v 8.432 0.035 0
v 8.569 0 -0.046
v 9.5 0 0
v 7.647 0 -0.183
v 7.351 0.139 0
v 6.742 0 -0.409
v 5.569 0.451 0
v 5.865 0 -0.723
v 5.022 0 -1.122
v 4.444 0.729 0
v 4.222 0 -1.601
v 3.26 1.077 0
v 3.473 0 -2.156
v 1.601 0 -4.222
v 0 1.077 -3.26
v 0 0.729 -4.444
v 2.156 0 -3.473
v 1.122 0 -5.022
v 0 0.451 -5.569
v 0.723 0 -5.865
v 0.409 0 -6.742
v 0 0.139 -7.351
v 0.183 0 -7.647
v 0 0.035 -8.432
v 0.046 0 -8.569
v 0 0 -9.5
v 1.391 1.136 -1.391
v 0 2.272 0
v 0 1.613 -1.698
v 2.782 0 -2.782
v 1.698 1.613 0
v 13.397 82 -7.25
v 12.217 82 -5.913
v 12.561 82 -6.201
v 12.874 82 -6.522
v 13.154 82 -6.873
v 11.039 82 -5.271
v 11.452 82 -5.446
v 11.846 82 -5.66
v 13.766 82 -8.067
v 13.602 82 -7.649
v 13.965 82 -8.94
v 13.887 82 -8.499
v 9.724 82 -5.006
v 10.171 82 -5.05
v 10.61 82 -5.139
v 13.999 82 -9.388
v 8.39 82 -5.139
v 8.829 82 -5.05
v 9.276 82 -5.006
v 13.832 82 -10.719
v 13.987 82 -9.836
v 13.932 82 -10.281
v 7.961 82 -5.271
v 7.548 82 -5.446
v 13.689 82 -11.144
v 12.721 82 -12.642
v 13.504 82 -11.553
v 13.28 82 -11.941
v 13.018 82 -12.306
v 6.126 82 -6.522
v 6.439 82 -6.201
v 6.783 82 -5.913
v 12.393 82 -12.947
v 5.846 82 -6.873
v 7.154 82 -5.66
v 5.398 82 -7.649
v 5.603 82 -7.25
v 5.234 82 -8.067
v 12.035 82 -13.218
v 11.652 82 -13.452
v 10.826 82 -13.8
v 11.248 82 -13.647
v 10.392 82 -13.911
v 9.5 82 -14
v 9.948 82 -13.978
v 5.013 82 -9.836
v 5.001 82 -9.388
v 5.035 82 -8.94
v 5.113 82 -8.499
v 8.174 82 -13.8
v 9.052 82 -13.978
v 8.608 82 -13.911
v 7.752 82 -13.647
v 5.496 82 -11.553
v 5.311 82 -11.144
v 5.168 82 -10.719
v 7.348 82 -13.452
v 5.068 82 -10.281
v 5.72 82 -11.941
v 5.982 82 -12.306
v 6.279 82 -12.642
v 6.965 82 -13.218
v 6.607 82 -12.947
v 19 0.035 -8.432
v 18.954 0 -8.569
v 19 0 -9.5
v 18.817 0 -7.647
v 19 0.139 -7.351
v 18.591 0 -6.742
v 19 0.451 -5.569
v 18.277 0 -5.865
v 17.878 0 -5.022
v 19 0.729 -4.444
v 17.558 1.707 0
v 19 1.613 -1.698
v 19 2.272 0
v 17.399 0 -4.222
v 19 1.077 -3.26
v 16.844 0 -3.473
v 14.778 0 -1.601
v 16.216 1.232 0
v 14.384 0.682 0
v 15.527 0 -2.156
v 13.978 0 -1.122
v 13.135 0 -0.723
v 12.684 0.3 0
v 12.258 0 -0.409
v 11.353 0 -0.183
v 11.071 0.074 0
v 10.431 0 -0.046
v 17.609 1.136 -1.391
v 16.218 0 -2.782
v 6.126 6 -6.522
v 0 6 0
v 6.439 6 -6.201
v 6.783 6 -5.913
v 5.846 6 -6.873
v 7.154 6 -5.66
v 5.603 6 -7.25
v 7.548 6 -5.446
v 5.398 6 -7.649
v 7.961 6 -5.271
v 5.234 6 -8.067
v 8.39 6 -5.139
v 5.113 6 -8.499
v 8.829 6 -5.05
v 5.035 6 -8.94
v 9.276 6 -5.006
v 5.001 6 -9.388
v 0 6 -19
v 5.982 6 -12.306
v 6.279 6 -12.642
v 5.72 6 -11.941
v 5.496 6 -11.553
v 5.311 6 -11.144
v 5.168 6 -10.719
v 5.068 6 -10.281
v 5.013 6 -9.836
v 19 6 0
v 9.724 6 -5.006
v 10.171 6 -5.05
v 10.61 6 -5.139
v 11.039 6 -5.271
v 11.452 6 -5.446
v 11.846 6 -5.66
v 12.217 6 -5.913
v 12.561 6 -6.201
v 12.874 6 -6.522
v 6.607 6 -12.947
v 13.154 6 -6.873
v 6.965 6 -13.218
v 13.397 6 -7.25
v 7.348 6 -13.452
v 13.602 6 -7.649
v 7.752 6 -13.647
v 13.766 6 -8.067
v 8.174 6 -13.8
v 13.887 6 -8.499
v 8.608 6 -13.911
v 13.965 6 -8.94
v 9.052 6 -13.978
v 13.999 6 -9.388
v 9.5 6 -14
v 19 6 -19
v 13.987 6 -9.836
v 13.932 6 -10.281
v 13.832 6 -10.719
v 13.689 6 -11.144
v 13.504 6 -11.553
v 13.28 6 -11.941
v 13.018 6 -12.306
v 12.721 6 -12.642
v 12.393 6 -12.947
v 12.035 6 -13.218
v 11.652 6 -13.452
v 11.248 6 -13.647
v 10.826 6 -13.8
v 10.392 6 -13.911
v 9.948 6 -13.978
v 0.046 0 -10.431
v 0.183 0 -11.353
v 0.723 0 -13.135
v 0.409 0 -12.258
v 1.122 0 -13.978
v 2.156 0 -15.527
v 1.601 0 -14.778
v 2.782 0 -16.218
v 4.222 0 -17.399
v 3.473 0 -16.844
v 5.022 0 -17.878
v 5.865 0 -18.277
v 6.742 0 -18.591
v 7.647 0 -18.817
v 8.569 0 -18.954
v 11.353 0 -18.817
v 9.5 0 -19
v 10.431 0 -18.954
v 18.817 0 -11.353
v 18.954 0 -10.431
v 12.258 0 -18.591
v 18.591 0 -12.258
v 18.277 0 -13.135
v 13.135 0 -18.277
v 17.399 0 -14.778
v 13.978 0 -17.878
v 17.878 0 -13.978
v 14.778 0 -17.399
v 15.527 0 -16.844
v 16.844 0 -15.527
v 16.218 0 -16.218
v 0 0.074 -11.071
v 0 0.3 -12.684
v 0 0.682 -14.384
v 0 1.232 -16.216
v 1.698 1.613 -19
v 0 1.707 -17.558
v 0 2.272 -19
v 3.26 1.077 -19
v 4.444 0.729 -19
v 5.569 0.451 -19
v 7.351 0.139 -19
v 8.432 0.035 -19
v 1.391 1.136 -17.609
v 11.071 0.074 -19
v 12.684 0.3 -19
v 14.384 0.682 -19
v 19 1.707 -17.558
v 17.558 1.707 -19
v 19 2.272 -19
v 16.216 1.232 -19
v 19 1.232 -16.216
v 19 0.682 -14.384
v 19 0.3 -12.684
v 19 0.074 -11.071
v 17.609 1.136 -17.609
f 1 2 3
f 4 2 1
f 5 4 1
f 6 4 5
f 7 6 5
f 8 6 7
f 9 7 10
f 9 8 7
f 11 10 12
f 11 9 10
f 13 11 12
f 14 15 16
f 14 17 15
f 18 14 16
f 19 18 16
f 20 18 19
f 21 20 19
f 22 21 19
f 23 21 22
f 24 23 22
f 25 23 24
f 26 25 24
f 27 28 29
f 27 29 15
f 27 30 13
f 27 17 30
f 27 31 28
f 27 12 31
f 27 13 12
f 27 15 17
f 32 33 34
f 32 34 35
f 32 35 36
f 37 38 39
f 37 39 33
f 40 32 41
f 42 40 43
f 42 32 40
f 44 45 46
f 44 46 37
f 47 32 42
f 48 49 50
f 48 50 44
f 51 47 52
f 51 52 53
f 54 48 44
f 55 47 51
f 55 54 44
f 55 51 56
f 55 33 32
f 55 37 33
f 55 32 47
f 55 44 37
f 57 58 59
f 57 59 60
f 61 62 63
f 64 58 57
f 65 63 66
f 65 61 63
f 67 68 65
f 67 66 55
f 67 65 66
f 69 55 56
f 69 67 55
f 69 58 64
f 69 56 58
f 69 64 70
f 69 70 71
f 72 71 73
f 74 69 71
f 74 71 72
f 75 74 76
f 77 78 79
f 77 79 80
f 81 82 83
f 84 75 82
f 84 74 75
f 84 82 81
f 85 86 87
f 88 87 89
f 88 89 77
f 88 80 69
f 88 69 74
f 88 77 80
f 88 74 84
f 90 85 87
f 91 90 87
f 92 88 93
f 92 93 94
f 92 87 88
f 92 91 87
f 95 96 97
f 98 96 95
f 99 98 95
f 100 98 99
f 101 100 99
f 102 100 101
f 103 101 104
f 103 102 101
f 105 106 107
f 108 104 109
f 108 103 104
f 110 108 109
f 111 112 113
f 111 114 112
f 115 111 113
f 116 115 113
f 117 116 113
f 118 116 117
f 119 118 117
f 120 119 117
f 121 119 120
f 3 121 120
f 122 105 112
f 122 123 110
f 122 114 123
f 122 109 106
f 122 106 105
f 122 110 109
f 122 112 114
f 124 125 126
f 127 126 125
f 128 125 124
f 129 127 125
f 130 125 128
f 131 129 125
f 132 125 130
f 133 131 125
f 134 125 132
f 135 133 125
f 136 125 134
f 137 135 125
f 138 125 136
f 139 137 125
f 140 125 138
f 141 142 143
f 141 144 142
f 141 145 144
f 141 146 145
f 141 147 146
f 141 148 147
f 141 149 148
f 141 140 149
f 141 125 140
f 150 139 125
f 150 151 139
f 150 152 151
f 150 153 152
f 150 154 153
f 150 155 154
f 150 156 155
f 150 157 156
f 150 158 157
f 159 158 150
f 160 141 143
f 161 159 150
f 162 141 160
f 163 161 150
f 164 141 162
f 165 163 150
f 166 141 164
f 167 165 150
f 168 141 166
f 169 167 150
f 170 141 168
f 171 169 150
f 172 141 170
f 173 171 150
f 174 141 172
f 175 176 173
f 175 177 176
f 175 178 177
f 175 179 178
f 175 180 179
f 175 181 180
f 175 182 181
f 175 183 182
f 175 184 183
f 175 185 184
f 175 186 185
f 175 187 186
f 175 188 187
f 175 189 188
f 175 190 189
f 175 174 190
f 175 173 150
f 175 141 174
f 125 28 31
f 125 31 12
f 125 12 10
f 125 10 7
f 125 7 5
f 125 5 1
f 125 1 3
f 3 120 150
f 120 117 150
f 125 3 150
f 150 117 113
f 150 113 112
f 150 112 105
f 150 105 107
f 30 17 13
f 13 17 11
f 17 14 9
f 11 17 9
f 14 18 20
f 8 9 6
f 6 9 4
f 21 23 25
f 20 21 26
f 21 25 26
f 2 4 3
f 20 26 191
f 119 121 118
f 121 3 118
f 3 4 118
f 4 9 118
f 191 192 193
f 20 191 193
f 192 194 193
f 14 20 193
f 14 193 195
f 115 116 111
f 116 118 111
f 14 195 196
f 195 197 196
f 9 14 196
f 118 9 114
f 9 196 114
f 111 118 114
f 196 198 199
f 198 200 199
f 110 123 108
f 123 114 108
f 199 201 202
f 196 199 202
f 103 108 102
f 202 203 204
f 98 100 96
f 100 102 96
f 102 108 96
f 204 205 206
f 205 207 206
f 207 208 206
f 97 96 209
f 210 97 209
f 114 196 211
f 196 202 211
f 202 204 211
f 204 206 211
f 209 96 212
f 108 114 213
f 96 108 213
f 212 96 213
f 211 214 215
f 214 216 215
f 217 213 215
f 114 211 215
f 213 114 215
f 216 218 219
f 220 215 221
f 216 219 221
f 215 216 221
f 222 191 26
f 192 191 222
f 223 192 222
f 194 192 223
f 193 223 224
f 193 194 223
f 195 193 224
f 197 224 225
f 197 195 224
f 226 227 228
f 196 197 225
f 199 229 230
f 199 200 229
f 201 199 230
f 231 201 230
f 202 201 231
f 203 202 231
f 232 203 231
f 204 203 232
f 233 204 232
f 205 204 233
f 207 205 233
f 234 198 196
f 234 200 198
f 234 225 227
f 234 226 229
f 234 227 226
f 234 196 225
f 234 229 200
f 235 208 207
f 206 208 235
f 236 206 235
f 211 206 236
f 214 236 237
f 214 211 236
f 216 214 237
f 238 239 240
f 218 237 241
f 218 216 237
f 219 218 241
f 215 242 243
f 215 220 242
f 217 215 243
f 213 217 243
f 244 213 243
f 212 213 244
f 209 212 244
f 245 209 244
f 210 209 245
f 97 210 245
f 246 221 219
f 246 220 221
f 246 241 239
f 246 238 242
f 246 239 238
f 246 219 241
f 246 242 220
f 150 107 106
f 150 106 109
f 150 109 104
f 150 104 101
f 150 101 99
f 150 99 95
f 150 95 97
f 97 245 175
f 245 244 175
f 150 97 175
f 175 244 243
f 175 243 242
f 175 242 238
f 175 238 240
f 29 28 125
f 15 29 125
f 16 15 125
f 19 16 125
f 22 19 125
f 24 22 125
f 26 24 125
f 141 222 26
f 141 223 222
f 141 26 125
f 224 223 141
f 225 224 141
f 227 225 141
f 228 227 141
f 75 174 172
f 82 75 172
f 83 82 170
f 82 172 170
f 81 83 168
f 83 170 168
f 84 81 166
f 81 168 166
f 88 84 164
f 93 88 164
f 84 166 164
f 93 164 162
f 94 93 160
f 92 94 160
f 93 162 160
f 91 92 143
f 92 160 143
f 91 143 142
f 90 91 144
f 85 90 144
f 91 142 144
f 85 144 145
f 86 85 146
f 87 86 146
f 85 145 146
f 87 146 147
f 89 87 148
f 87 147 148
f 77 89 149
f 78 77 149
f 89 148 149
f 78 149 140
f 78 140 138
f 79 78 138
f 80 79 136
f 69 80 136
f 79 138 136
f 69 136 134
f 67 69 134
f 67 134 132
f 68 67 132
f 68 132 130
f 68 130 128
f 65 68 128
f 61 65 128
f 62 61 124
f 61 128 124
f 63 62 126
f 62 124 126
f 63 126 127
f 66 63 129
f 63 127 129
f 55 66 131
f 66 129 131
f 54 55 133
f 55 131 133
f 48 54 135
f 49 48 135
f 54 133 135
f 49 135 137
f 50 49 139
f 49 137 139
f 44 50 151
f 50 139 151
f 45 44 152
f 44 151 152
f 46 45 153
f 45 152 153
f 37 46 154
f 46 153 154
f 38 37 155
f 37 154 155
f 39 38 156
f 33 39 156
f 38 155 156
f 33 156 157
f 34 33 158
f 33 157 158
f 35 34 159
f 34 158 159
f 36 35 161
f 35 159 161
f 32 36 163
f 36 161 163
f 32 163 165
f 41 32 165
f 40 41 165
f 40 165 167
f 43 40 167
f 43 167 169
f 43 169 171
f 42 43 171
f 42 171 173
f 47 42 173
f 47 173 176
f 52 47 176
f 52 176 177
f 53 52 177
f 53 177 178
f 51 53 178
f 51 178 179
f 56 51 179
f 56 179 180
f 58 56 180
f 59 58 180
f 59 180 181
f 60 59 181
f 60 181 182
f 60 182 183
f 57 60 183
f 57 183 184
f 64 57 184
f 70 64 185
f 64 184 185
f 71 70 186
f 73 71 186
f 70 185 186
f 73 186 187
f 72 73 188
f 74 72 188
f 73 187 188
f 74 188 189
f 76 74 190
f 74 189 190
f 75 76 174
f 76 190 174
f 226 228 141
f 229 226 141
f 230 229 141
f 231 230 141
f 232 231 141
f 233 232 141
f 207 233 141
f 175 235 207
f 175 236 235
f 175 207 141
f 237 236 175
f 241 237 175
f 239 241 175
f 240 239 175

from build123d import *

# Parameters (mm, degrees)
SKETCH1_W           = 19
SKETCH1_H           = 19
BOSS_EXTRUDE1_DEPTH = 6
SKETCH2_R           = 4.5
BOSS_EXTRUDE2_DEPTH = 76
SKETCH13_OUTSIDE_W  = 59.042
SKETCH13_OUTSIDE_H  = 59.042
SKETCH13_OUTSIDE_R  = 9.5
CUT_EXTRUDE1_DEPTH  = 6
CUT_EXTRUDE1_DRAFT  = -60


with BuildPart() as part:
    # Sketch1 → Boss-Extrude1 (new body)
    with BuildSketch(Plane(origin=(0, 0, 0), x_dir=(1, 0, 0), z_dir=(0, 1, 0))):
        with Locations((9.5, 9.5)):
            Rectangle(SKETCH1_W, SKETCH1_H)
    extrude(amount=BOSS_EXTRUDE1_DEPTH)

    # Sketch2 → Boss-Extrude2 (add)
    with BuildSketch(Plane(origin=(0, 6, 0), x_dir=(1, 0, 0), z_dir=(0, 1, 0))):
        with Locations(Location((9.5, 9.5, 0), (0, 0, 90))):  # turned: the seam where the file's is
            Circle(SKETCH2_R)
    extrude(amount=BOSS_EXTRUDE2_DEPTH)


with BuildPart() as cut_extrude1_tool:
    # Sketch13 outside → Cut-Extrude1 (with draft: the straight prism first)
    with BuildSketch(Plane(origin=(0, 0, 0), x_dir=(-1, 0, 0), z_dir=(0, -1, 0))):
        with Locations((-9.5, 9.5)):
            Rectangle(SKETCH13_OUTSIDE_W, SKETCH13_OUTSIDE_H)
        with Locations((-9.5, 9.5)):
            Circle(SKETCH13_OUTSIDE_R, mode=Mode.SUBTRACT)
    extrude(amount=-CUT_EXTRUDE1_DEPTH)
    # Cut-Extrude1: the draft: its side faces are tilted about the plane it starts from
    cut_extrude1_sides = [cut_extrude1_tool.faces().sort_by_distance(p)[0] for p in [
        (9.5, 3, 20.021),
        (-20.021, 3, -9.5),
        (9.5, 3, -39.021),
        (39.021, 3, -9.5),
        (19, 3, -9.5),
    ]]
    draft(cut_extrude1_sides, Plane(origin=(0, 0, 0), x_dir=(-1, 0, 0), z_dir=(0, -1, 0)), CUT_EXTRUDE1_DRAFT)


with BuildPart() as part_1:
    add(part.part)

    # Cut-Extrude1: cut by cut_extrude1_tool
    add(cut_extrude1_tool.part, mode=Mode.SUBTRACT)


solid = part_1.part
